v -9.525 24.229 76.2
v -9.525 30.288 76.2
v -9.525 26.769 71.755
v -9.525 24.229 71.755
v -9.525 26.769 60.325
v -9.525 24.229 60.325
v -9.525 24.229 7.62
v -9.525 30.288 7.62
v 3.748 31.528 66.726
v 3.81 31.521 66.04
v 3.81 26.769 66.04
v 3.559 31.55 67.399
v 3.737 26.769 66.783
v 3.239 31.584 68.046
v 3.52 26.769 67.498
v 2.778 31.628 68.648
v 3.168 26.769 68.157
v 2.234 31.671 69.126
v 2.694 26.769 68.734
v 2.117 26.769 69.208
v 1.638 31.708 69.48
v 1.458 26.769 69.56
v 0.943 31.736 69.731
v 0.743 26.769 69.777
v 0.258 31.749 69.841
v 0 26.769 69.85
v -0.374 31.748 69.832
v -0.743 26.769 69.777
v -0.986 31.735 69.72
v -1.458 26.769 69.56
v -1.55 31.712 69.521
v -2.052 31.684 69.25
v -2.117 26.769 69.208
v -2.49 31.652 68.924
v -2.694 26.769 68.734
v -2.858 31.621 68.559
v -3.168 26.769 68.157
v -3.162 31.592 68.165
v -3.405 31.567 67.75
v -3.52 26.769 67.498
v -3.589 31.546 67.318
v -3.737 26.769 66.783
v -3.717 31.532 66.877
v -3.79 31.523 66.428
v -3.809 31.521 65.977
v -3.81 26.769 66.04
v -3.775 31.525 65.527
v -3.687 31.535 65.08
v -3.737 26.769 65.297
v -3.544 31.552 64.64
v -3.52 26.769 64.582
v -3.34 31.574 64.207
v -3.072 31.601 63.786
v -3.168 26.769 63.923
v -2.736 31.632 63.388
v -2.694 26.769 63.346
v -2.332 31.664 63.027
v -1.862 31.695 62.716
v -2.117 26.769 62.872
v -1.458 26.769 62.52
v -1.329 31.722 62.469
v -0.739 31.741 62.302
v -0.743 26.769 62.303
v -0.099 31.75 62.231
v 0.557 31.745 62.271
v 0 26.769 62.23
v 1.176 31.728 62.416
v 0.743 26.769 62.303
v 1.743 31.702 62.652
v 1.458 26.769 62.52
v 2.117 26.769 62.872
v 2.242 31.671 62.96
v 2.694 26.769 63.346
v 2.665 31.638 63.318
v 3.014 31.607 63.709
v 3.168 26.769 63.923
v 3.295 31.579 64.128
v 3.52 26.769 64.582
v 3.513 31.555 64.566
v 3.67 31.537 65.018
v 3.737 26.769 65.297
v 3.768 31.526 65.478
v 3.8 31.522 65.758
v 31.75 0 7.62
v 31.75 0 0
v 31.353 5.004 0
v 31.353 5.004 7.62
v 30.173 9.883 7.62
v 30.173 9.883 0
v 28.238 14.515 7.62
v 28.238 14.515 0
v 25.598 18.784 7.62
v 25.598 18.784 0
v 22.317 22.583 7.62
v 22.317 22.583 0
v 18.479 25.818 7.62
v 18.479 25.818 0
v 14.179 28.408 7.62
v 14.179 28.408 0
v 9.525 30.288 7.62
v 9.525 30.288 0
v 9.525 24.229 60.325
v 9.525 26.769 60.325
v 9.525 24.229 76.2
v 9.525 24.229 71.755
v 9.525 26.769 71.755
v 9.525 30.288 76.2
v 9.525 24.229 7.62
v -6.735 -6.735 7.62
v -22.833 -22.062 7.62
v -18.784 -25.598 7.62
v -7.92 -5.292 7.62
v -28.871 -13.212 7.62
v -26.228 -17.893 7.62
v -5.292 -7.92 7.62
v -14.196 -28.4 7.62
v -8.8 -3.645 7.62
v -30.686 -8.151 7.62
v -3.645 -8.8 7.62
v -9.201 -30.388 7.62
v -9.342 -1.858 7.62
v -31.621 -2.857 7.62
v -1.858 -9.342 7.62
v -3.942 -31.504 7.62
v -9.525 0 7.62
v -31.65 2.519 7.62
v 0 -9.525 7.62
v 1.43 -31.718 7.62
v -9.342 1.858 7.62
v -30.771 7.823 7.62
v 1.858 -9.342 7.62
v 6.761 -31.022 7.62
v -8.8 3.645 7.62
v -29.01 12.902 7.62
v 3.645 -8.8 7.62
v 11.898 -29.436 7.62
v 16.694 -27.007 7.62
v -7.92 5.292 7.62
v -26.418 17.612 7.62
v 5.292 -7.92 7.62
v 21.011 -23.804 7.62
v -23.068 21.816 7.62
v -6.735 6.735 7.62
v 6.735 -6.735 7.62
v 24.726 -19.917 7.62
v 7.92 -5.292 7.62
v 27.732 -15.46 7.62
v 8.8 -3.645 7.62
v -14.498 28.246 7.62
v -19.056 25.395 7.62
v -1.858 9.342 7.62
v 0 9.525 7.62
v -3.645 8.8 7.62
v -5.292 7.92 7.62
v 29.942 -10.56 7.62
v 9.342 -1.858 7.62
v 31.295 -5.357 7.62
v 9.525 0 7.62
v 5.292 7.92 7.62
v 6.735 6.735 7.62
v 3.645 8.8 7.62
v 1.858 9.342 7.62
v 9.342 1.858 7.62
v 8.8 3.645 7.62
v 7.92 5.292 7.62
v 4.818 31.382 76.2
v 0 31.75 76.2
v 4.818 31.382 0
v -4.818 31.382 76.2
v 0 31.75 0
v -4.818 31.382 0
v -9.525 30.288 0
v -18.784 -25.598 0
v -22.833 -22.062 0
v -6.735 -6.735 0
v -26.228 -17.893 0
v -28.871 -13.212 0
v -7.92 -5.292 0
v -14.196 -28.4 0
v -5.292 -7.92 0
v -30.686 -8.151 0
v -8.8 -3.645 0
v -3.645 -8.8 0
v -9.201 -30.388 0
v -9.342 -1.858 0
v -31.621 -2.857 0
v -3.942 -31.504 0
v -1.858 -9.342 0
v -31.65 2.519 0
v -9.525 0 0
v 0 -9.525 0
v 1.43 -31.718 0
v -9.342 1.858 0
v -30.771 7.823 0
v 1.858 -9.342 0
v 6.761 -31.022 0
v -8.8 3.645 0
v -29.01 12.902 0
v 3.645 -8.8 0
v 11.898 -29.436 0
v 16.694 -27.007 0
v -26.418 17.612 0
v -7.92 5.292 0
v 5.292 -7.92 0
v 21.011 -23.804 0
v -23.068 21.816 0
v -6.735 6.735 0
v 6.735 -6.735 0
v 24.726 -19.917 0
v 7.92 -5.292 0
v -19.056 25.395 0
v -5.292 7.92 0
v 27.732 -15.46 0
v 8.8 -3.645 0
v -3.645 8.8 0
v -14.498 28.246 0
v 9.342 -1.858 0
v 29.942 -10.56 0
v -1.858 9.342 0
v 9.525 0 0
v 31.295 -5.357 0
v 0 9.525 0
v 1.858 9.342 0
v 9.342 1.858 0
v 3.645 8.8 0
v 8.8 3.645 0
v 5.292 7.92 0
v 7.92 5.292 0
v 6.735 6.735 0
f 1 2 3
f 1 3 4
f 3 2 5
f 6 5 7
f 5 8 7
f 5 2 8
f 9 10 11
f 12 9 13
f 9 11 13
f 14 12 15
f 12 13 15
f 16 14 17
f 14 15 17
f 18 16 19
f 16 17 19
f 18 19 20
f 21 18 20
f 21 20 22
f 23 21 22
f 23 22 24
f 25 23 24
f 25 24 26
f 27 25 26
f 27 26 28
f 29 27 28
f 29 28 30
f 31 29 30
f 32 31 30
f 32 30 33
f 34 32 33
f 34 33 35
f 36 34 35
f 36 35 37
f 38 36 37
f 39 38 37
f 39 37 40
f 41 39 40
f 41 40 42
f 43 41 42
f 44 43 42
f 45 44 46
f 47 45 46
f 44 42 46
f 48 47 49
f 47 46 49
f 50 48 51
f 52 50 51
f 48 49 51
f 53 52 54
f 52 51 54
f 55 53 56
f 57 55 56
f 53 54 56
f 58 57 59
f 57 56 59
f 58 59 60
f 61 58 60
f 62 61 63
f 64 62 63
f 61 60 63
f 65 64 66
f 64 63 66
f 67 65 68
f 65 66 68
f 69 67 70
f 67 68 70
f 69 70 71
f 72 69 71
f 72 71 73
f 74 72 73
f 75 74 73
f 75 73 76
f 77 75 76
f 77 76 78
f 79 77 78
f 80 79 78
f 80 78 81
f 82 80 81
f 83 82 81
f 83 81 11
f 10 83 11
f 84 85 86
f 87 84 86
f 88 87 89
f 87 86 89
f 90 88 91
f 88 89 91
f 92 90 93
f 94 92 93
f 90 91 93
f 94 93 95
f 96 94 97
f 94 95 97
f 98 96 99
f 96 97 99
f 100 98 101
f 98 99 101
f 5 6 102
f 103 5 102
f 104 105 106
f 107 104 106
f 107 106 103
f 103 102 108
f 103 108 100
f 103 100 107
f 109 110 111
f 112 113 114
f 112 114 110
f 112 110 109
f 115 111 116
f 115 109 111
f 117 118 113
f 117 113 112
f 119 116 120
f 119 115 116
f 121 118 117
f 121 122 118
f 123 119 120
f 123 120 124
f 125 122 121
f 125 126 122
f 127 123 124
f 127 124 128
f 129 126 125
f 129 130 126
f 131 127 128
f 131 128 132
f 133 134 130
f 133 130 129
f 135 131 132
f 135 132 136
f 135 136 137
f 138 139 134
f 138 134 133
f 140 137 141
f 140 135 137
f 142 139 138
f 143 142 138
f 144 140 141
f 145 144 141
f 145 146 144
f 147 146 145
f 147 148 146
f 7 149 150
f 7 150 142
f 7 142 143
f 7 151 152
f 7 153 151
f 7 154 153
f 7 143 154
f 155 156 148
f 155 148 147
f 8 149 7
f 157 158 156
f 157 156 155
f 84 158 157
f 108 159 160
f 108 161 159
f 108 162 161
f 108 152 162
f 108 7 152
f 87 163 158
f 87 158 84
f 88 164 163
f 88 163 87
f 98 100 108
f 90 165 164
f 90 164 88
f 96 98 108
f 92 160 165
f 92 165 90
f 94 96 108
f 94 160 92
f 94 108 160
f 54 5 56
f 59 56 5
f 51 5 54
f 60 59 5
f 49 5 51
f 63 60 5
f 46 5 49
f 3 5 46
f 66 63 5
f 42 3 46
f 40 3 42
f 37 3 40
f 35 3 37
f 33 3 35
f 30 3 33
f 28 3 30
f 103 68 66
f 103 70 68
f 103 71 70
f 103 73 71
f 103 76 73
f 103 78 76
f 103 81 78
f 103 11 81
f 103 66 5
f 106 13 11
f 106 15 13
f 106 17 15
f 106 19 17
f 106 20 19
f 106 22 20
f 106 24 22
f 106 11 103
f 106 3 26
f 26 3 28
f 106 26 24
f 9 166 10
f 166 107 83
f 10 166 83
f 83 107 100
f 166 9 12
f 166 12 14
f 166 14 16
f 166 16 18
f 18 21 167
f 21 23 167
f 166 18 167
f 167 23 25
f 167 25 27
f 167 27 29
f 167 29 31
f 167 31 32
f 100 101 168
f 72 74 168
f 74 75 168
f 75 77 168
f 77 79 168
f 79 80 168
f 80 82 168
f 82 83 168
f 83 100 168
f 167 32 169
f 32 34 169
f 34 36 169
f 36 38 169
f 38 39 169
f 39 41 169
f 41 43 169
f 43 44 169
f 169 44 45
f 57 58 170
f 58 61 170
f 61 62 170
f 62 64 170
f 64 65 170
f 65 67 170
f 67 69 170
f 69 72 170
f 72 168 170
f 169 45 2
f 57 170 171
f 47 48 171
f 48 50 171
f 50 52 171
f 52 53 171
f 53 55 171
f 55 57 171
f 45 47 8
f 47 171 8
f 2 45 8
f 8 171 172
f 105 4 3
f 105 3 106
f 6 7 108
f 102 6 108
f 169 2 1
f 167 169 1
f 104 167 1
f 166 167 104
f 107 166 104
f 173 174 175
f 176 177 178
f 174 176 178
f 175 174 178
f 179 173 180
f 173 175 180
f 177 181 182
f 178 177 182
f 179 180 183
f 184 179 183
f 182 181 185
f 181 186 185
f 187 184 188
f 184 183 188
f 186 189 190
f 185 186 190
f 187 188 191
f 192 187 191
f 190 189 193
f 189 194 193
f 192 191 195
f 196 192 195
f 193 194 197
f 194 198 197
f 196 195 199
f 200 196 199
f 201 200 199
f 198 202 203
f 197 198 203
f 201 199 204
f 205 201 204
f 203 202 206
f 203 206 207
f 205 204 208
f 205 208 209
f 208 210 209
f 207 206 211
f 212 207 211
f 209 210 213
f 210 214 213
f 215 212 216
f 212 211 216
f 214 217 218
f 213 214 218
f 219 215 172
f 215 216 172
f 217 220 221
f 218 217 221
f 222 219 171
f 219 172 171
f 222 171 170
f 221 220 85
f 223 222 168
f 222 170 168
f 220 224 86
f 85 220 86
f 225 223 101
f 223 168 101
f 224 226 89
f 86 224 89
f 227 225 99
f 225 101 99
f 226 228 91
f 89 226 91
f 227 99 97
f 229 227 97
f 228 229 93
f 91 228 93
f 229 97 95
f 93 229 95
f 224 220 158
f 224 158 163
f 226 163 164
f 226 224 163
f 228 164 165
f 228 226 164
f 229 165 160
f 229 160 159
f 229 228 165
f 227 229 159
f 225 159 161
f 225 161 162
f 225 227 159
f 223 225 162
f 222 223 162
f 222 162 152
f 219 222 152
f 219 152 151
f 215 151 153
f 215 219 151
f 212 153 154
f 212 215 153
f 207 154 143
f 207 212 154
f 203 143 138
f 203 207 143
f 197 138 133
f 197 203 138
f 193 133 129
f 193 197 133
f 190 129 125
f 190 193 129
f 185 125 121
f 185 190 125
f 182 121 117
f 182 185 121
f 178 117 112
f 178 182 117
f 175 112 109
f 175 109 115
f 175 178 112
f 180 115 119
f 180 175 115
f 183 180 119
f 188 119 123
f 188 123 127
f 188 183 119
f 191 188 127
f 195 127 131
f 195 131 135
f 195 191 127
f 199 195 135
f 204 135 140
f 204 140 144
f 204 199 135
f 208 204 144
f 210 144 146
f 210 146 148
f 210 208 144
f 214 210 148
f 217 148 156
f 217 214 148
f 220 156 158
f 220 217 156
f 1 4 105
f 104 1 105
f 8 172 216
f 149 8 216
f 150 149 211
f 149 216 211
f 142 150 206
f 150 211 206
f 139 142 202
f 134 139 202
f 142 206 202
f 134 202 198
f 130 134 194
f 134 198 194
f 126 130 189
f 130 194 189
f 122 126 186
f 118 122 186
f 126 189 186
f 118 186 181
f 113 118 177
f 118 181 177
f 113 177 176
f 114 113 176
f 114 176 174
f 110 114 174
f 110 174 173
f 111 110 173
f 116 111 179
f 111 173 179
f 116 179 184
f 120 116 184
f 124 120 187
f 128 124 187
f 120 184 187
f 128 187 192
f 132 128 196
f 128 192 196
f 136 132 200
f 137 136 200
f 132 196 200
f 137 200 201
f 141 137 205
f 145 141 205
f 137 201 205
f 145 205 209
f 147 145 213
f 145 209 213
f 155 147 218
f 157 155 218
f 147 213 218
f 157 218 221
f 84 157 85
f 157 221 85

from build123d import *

# Parameters (mm, degrees)
F0_R     = 9.525
F0_W     = 19.05
F0_H     = 2.596250779
F1_DEPTH = 7.62
F2_DEPTH = 76.2
F3_R     = 3.81
F4_DEPTH = 25.4
F3_W     = 19.05
F3_H     = 11.43
F5_DEPTH = 2.54


with BuildPart() as f1:
    # F0 (on Top) → F1 (new body)
    with BuildSketch(Plane.XY):
        with BuildLine():
            Line((9.525, 24.2291148752), (9.525, 30.287569645))
            ThreePointArc((9.525, 30.287569645), (0, 31.75), (-9.525, 30.287569645))
            Line((-9.525, 30.287569645), (-9.525, 24.2291148752))
            Line((-9.525, 24.2291148752), (9.525, 24.2291148752))
        make_face()
        with BuildLine():
            ThreePointArc((-9.525, 30.287569645), (-18.7835533113, -25.5976683508), (31.75, 0))
            ThreePointArc((31.75, 0), (25.5976683508, 18.7835533113), (9.525, 30.287569645))
            Line((9.525, 30.287569645), (9.525, 24.2291148752))
            Line((9.525, 24.2291148752), (9.525, 21.6328640962))
            Line((9.525, 21.6328640962), (-9.525, 21.6328640962))
            Line((-9.525, 21.6328640962), (-9.525, 24.2291148752))
            Line((-9.525, 24.2291148752), (-9.525, 30.287569645))
        make_face()
        Circle(F0_R, mode=Mode.SUBTRACT)
        with Locations((0, 22.9309894857)):
            Rectangle(F0_W, F0_H)
    extrude(amount=F1_DEPTH)

    # F0 (on Top) → F2 (join)
    with BuildSketch(Plane.XY):
        with BuildLine():
            Line((9.525, 24.2291148752), (9.525, 30.287569645))
            ThreePointArc((9.525, 30.287569645), (0, 31.75), (-9.525, 30.287569645))
            Line((-9.525, 30.287569645), (-9.525, 24.2291148752))
            Line((-9.525, 24.2291148752), (9.525, 24.2291148752))
        make_face()
    extrude(amount=F2_DEPTH)

    # F3 (on face) → F4 (cut)
    with BuildSketch(Plane.XZ.offset(-24.2291148752)):
        with Locations((0, 66.04)):
            Circle(F3_R)
    extrude(amount=-F4_DEPTH, mode=Mode.SUBTRACT)

    # F3 (on face) → F5 (cut)
    with BuildSketch(Plane.XZ.offset(-24.2291148752)):
        with Locations((0, 66.04)):
            Rectangle(F3_W, F3_H)
        with Locations((0, 66.04)):
            Circle(F3_R, mode=Mode.SUBTRACT)
    extrude(amount=-F5_DEPTH, mode=Mode.SUBTRACT)


solid = f1.part
